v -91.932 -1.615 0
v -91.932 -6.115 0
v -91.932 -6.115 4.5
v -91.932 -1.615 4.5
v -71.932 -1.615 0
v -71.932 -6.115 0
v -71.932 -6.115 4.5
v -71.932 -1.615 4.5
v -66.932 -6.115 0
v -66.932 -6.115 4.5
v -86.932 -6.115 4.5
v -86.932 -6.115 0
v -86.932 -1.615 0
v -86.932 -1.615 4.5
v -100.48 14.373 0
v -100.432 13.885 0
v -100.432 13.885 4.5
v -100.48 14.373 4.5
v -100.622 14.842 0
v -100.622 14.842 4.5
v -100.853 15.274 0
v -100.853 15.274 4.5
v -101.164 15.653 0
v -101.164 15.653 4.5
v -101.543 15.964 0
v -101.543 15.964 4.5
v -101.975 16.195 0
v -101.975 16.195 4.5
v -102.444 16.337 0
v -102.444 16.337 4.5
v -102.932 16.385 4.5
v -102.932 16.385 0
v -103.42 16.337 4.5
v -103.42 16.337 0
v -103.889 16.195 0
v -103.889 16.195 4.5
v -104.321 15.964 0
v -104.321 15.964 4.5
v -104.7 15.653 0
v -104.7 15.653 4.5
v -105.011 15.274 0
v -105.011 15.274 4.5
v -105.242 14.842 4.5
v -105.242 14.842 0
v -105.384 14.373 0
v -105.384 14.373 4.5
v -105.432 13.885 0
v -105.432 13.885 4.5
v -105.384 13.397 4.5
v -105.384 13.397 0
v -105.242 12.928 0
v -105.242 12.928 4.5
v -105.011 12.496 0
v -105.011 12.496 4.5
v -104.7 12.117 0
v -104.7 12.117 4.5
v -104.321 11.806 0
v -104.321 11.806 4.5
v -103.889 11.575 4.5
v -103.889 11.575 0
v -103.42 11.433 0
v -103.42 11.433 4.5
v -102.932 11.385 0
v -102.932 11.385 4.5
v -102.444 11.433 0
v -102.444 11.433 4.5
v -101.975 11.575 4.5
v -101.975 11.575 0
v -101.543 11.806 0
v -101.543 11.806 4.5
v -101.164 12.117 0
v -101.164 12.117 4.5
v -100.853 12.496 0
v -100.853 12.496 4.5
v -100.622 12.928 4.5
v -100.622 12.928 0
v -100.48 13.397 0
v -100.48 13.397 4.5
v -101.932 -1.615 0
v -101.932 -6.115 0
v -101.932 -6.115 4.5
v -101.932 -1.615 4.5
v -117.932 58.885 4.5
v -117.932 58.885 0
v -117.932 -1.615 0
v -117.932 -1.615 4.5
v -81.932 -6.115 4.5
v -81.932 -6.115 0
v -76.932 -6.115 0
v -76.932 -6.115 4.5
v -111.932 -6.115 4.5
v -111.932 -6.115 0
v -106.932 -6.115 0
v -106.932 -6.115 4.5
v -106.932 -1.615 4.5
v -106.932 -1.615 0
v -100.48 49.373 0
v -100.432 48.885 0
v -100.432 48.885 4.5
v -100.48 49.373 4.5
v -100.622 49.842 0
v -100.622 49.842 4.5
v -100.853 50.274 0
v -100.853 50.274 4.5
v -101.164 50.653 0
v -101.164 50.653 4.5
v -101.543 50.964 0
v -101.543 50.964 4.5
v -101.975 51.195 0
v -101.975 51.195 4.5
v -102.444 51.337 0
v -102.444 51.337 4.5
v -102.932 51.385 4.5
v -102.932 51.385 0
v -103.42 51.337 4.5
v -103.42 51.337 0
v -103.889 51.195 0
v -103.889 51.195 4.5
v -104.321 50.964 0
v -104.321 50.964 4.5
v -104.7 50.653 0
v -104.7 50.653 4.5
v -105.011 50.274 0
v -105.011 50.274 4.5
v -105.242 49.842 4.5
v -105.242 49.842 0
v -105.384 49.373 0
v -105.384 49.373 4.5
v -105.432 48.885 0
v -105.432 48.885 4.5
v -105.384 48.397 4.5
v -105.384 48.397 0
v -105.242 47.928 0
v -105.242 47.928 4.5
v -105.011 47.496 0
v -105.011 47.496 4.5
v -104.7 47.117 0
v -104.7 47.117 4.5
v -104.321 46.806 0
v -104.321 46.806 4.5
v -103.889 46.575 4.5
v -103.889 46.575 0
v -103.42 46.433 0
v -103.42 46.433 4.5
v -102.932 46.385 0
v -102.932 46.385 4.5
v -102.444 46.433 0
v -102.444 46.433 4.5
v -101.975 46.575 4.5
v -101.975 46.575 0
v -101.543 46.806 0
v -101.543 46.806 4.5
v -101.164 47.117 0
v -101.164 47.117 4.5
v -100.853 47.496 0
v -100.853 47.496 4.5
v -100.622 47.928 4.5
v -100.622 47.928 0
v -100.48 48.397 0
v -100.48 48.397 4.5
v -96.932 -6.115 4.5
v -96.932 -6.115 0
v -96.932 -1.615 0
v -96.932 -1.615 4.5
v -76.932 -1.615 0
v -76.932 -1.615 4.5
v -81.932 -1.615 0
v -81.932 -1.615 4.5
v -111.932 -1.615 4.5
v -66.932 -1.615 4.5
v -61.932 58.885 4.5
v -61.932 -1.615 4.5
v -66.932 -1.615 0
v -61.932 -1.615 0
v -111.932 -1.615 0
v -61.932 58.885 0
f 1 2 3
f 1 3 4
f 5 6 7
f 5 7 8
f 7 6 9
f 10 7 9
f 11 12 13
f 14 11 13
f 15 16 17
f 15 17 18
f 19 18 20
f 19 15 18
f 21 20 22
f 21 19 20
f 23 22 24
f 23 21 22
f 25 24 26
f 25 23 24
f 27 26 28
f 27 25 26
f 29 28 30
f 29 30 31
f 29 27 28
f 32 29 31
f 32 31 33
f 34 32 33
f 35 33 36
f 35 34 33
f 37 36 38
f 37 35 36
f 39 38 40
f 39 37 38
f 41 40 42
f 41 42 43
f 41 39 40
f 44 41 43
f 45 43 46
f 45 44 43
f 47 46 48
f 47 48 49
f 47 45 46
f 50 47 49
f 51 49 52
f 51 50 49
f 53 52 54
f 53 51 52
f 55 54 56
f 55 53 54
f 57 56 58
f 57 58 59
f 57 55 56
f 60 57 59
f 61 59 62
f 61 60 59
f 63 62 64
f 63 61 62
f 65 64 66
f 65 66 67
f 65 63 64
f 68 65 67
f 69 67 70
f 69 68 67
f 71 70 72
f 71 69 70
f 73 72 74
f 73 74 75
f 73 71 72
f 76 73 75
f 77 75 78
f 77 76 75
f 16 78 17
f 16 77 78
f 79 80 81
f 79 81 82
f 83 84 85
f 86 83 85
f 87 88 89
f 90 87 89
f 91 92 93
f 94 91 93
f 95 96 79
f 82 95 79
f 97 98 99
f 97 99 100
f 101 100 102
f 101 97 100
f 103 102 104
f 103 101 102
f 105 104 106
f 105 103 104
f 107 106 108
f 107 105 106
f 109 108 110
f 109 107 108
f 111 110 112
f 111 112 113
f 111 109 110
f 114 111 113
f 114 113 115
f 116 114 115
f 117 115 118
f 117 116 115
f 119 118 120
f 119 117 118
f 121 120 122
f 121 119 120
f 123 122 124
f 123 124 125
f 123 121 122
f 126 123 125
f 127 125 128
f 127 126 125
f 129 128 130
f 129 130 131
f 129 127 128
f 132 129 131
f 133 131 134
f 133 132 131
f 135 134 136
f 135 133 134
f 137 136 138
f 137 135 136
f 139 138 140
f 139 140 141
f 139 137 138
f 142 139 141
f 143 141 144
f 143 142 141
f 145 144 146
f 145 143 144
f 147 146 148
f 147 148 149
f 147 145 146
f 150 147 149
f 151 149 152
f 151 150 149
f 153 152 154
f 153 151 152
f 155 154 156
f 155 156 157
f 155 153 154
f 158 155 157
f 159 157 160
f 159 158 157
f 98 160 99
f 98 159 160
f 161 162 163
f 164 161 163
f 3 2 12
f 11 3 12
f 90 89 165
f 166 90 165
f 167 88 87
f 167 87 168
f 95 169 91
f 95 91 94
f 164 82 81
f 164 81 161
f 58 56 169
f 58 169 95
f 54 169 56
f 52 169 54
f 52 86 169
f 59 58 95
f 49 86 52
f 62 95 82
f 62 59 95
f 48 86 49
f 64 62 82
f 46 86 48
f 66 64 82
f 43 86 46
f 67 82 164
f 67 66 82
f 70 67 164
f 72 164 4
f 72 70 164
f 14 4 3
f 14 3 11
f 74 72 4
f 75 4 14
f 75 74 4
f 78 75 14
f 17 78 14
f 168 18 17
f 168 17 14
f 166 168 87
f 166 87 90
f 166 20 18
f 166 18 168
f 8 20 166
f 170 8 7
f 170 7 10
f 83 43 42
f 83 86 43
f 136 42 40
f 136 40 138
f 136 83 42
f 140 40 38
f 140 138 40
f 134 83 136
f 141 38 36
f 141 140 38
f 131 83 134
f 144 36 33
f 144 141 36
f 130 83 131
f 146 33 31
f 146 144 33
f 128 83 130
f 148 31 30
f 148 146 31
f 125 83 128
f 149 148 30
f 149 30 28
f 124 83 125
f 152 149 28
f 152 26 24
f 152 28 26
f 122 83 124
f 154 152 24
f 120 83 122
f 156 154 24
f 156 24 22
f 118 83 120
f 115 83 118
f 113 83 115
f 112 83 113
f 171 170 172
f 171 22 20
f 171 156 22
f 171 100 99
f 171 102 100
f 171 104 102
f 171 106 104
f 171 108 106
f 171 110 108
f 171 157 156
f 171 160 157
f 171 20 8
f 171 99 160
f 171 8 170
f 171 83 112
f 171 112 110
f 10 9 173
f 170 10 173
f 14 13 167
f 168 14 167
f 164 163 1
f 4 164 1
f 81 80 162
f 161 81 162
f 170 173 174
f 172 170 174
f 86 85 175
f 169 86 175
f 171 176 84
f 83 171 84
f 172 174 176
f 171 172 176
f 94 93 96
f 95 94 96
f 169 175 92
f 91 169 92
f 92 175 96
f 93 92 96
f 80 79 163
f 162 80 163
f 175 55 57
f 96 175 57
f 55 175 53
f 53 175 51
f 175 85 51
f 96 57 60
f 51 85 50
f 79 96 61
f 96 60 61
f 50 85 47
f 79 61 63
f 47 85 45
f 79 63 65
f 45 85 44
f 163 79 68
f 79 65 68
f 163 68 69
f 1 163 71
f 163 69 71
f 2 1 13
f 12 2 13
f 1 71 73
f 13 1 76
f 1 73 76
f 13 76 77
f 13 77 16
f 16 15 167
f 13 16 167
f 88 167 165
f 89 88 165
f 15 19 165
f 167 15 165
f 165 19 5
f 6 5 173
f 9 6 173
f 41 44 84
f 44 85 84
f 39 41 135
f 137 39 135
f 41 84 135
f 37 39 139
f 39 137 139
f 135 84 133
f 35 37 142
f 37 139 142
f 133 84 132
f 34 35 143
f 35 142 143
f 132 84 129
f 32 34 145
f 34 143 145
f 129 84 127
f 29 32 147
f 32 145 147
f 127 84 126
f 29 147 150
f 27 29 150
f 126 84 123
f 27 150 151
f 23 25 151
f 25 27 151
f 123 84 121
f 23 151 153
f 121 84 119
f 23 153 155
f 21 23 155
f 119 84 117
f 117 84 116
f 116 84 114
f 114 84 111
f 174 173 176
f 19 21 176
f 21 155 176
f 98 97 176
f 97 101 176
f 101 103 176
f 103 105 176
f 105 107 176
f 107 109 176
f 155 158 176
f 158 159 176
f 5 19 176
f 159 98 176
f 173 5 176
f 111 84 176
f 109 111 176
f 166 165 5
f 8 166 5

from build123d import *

# Parameters (mm, degrees)
SKETCH1_R           = 2.5
SKETCH1_W           = 5
SKETCH1_H           = 4.5
BOSS_EXTRUDE1_DEPTH = 4.5


with BuildPart() as part:
    # Sketch1 → Boss-Extrude1 (new body)
    # profile 1 of 5: a face of its own
    with BuildSketch(Plane.XY):
        Polygon((-111.932160423, -1.614828107), (-111.932160423, -6.114828107), (-106.932160423, -6.114828107), (-106.932160423, -1.614828107), (-101.932160423, -1.614828107), (-96.932160423, -1.614828107), (-91.932160423, -1.614828107), (-86.932160423, -1.614828107), (-81.932160423, -1.614828107), (-76.932160423, -1.614828107), (-71.932160423, -1.614828107), (-66.932160423, -1.614828107), (-61.932160423, -1.614828107), (-61.932160423, 58.885171893), (-117.932160423, 58.885171893), (-117.932160423, -1.614828107), align=None)
        with Locations((-102.932160423, 13.885171893)):
            Circle(SKETCH1_R, mode=Mode.SUBTRACT)
        with Locations((-102.932160423, 48.885171893)):
            Circle(SKETCH1_R, mode=Mode.SUBTRACT)
    # profile 2 of 5: a face of its own
    with BuildSketch(Plane.XY):
        with Locations((-99.432160423, -3.864828107)):
            Rectangle(SKETCH1_W, SKETCH1_H)
    # profile 3 of 5: a face of its own
    with BuildSketch(Plane.XY):
        with Locations((-69.432160423, -3.864828107)):
            Rectangle(SKETCH1_W, SKETCH1_H)
    # profile 4 of 5: a face of its own
    with BuildSketch(Plane.XY):
        with Locations((-79.432160423, -3.864828107)):
            Rectangle(SKETCH1_W, SKETCH1_H)
    # profile 5 of 5: a face of its own
    with BuildSketch(Plane.XY):
        with Locations((-89.432160423, -3.864828107)):
            Rectangle(SKETCH1_W, SKETCH1_H)
    extrude(amount=BOSS_EXTRUDE1_DEPTH)


solid = part.part
